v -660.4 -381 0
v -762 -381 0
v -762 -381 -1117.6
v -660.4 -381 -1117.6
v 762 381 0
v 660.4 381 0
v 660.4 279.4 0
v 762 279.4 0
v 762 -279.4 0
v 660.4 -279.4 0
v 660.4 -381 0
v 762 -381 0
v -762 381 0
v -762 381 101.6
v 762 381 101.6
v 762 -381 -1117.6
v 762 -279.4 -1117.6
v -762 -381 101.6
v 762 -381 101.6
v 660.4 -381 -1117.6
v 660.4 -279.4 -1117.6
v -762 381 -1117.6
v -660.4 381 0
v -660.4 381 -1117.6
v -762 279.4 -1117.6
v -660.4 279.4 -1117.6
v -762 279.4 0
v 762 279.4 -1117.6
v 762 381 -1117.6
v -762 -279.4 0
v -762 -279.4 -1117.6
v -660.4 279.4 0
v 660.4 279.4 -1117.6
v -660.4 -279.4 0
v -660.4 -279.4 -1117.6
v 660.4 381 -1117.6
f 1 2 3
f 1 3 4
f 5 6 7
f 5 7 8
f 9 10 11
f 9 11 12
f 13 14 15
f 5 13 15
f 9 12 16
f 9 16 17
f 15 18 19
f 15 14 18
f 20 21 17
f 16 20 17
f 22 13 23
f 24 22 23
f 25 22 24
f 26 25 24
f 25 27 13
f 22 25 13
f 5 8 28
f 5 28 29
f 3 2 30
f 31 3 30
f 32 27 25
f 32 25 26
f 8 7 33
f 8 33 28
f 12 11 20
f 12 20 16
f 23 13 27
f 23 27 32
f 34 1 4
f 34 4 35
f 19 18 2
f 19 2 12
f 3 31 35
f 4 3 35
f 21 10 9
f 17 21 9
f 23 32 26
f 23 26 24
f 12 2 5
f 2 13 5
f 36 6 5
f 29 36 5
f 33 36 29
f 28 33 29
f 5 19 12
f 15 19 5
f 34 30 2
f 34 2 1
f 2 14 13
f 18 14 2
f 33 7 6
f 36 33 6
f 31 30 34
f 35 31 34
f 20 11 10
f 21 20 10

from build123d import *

# Parameters (mm, degrees)
F4_W     = 101.6
F4_H     = 101.6
F5_DEPTH = 1117.6
F6_W     = 1524
F6_H     = 50.8
F7_DEPTH = 101.6


with BuildPart() as f5:
    # F4 (on Top) → F5 (new body)
    with BuildSketch(Plane.XY):
        with Locations((-711.2, 330.2)):
            Rectangle(F4_W, F4_H)
    extrude(amount=-F5_DEPTH)


with BuildPart() as f5b:
    # F4 (on Top) → F5, piece 2 (new body)
    with BuildSketch(Plane.XY):
        with Locations((711.2, 330.2)):
            Rectangle(F4_W, F4_H)
    extrude(amount=-F5_DEPTH)


with BuildPart() as f5c:
    # F4 (on Top) → F5, piece 3 (new body)
    with BuildSketch(Plane.XY):
        with Locations((711.2, -330.2)):
            Rectangle(F4_W, F4_H)
    extrude(amount=-F5_DEPTH)


with BuildPart() as f5d:
    # F4 (on Top) → F5, piece 4 (new body)
    with BuildSketch(Plane.XY):
        with Locations((-711.2, -330.2)):
            Rectangle(F4_W, F4_H)
    extrude(amount=-F5_DEPTH)


with BuildPart() as f7:
    # F6 (on offset) → F7 (new body)
    with BuildSketch(Plane.XY.offset(101.6)):
        with Locations((0, -355.6)):
            Rectangle(F6_W, F6_H)
        with Locations((0, -304.8)):
            Rectangle(F6_W, F6_H)
        with Locations((0, -254)):
            Rectangle(F6_W, F6_H)
        with Locations((0, -203.2)):
            Rectangle(F6_W, F6_H)
        with Locations((0, -152.4)):
            Rectangle(F6_W, F6_H)
        with Locations((0, -101.6)):
            Rectangle(F6_W, F6_H)
        with Locations((0, -50.8)):
            Rectangle(F6_W, F6_H)
        Rectangle(F6_W, F6_H)
        with Locations((0, 50.8)):
            Rectangle(F6_W, F6_H)
        with Locations((0, 101.6)):
            Rectangle(F6_W, F6_H)
        with Locations((0, 152.4)):
            Rectangle(F6_W, F6_H)
        with Locations((0, 203.2)):
            Rectangle(F6_W, F6_H)
        with Locations((0, 254)):
            Rectangle(F6_W, F6_H)
        with Locations((0, 304.8)):
            Rectangle(F6_W, F6_H)
        with Locations((0, 355.6)):
            Rectangle(F6_W, F6_H)
    extrude(amount=-F7_DEPTH)


solid = Compound([f5.part, f5b.part, f5c.part, f5d.part, f7.part])
